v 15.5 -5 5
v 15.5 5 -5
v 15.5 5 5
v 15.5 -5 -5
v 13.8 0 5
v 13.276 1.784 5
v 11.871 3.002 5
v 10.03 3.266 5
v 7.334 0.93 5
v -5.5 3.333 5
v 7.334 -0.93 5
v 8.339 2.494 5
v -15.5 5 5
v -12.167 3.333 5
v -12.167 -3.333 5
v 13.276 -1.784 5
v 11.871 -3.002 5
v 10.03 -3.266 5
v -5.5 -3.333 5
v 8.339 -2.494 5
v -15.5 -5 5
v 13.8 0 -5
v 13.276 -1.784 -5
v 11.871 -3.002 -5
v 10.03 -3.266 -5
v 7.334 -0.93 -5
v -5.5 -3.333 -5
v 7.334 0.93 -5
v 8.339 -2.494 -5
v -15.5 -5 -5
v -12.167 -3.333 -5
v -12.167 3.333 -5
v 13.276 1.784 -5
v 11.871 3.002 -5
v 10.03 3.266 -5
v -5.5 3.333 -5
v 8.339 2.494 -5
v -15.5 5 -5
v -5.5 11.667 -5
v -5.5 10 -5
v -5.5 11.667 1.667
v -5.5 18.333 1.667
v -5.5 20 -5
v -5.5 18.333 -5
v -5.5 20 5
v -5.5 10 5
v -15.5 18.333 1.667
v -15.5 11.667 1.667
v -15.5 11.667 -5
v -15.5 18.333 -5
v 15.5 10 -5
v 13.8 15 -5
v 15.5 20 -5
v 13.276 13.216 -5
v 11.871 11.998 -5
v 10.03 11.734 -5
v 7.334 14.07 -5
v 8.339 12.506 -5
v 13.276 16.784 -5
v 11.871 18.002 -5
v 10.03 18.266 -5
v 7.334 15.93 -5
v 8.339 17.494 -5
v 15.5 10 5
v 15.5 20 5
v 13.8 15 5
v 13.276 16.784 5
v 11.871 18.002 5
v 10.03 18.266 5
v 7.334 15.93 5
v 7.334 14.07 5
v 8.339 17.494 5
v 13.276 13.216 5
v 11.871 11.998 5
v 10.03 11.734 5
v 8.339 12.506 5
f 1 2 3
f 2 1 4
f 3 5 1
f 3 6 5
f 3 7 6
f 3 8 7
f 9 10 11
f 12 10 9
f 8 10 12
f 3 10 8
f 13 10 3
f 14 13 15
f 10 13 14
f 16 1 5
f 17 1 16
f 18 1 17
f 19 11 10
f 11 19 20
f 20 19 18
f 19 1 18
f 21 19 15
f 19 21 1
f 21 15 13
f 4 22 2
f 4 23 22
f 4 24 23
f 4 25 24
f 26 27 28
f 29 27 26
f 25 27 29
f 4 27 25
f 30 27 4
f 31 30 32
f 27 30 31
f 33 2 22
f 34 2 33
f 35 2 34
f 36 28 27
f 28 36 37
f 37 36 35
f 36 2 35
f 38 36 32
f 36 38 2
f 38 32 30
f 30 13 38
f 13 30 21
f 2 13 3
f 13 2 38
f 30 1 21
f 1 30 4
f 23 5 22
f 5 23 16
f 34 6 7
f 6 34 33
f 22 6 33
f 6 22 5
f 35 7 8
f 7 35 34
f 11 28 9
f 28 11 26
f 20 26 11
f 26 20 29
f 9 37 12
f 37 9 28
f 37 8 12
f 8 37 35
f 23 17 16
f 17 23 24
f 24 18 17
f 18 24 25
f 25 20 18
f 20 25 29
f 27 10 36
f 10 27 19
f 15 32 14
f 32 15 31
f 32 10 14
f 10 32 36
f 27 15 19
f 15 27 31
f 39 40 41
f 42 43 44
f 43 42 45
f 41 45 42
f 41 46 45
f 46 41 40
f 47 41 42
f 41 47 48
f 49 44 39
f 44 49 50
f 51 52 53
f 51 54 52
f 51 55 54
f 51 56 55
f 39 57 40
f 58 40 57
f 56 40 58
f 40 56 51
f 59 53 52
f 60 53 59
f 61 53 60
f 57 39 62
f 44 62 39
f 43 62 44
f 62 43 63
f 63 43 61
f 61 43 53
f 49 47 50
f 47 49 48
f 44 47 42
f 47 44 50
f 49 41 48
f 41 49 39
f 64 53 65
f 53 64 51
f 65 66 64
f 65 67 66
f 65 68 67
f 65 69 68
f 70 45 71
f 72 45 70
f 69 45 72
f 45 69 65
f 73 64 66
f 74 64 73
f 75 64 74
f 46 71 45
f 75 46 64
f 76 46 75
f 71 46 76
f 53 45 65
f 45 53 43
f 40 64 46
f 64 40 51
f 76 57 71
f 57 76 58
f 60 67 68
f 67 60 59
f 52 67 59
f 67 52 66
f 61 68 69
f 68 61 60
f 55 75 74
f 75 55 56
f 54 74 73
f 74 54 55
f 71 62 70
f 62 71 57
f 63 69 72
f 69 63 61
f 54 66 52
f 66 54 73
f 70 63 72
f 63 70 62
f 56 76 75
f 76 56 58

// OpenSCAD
guiding_length = 10;
x = 2;
space = 16;
potentiometer_diameter = 6.6;
alpha = 2/3;

total_length = guiding_length*3/2+space;

// Bottom part
difference(){
	union(){
		cube(size=[total_length,guiding_length,guiding_length], center = true);
	}

	translate([total_length/2-guiding_length/2,0,0]) cylinder(r=potentiometer_diameter/2, h=10*guiding_length, center = true);
	translate([-total_length/2+guiding_length/2+guiding_length*(1-alpha)/2,0,0]) cube(size=[alpha*guiding_length, alpha*guiding_length, 2*guiding_length],center = true) ;
}


// Top part to be inserted at 90deg
translate([0,1.5*guiding_length,0])
union(){
difference(){
	union(){
		cube(size=[total_length,guiding_length,guiding_length], center = true);
	}

	translate([total_length/2-guiding_length/2,0,0]) cylinder(r=potentiometer_diameter/2, h=10*guiding_length, center = true);

	difference(){
	translate([-total_length/2+guiding_length/2-1,0,0]) cube(size=[guiding_length+2, guiding_length+2, 2*guiding_length],center = true) ;
	translate([-total_length/2+guiding_length/2,0,-guiding_length*(1-alpha)/2]) cube(size=[guiding_length, alpha*guiding_length, alpha*guiding_length],center = true) ;
}
}
}
